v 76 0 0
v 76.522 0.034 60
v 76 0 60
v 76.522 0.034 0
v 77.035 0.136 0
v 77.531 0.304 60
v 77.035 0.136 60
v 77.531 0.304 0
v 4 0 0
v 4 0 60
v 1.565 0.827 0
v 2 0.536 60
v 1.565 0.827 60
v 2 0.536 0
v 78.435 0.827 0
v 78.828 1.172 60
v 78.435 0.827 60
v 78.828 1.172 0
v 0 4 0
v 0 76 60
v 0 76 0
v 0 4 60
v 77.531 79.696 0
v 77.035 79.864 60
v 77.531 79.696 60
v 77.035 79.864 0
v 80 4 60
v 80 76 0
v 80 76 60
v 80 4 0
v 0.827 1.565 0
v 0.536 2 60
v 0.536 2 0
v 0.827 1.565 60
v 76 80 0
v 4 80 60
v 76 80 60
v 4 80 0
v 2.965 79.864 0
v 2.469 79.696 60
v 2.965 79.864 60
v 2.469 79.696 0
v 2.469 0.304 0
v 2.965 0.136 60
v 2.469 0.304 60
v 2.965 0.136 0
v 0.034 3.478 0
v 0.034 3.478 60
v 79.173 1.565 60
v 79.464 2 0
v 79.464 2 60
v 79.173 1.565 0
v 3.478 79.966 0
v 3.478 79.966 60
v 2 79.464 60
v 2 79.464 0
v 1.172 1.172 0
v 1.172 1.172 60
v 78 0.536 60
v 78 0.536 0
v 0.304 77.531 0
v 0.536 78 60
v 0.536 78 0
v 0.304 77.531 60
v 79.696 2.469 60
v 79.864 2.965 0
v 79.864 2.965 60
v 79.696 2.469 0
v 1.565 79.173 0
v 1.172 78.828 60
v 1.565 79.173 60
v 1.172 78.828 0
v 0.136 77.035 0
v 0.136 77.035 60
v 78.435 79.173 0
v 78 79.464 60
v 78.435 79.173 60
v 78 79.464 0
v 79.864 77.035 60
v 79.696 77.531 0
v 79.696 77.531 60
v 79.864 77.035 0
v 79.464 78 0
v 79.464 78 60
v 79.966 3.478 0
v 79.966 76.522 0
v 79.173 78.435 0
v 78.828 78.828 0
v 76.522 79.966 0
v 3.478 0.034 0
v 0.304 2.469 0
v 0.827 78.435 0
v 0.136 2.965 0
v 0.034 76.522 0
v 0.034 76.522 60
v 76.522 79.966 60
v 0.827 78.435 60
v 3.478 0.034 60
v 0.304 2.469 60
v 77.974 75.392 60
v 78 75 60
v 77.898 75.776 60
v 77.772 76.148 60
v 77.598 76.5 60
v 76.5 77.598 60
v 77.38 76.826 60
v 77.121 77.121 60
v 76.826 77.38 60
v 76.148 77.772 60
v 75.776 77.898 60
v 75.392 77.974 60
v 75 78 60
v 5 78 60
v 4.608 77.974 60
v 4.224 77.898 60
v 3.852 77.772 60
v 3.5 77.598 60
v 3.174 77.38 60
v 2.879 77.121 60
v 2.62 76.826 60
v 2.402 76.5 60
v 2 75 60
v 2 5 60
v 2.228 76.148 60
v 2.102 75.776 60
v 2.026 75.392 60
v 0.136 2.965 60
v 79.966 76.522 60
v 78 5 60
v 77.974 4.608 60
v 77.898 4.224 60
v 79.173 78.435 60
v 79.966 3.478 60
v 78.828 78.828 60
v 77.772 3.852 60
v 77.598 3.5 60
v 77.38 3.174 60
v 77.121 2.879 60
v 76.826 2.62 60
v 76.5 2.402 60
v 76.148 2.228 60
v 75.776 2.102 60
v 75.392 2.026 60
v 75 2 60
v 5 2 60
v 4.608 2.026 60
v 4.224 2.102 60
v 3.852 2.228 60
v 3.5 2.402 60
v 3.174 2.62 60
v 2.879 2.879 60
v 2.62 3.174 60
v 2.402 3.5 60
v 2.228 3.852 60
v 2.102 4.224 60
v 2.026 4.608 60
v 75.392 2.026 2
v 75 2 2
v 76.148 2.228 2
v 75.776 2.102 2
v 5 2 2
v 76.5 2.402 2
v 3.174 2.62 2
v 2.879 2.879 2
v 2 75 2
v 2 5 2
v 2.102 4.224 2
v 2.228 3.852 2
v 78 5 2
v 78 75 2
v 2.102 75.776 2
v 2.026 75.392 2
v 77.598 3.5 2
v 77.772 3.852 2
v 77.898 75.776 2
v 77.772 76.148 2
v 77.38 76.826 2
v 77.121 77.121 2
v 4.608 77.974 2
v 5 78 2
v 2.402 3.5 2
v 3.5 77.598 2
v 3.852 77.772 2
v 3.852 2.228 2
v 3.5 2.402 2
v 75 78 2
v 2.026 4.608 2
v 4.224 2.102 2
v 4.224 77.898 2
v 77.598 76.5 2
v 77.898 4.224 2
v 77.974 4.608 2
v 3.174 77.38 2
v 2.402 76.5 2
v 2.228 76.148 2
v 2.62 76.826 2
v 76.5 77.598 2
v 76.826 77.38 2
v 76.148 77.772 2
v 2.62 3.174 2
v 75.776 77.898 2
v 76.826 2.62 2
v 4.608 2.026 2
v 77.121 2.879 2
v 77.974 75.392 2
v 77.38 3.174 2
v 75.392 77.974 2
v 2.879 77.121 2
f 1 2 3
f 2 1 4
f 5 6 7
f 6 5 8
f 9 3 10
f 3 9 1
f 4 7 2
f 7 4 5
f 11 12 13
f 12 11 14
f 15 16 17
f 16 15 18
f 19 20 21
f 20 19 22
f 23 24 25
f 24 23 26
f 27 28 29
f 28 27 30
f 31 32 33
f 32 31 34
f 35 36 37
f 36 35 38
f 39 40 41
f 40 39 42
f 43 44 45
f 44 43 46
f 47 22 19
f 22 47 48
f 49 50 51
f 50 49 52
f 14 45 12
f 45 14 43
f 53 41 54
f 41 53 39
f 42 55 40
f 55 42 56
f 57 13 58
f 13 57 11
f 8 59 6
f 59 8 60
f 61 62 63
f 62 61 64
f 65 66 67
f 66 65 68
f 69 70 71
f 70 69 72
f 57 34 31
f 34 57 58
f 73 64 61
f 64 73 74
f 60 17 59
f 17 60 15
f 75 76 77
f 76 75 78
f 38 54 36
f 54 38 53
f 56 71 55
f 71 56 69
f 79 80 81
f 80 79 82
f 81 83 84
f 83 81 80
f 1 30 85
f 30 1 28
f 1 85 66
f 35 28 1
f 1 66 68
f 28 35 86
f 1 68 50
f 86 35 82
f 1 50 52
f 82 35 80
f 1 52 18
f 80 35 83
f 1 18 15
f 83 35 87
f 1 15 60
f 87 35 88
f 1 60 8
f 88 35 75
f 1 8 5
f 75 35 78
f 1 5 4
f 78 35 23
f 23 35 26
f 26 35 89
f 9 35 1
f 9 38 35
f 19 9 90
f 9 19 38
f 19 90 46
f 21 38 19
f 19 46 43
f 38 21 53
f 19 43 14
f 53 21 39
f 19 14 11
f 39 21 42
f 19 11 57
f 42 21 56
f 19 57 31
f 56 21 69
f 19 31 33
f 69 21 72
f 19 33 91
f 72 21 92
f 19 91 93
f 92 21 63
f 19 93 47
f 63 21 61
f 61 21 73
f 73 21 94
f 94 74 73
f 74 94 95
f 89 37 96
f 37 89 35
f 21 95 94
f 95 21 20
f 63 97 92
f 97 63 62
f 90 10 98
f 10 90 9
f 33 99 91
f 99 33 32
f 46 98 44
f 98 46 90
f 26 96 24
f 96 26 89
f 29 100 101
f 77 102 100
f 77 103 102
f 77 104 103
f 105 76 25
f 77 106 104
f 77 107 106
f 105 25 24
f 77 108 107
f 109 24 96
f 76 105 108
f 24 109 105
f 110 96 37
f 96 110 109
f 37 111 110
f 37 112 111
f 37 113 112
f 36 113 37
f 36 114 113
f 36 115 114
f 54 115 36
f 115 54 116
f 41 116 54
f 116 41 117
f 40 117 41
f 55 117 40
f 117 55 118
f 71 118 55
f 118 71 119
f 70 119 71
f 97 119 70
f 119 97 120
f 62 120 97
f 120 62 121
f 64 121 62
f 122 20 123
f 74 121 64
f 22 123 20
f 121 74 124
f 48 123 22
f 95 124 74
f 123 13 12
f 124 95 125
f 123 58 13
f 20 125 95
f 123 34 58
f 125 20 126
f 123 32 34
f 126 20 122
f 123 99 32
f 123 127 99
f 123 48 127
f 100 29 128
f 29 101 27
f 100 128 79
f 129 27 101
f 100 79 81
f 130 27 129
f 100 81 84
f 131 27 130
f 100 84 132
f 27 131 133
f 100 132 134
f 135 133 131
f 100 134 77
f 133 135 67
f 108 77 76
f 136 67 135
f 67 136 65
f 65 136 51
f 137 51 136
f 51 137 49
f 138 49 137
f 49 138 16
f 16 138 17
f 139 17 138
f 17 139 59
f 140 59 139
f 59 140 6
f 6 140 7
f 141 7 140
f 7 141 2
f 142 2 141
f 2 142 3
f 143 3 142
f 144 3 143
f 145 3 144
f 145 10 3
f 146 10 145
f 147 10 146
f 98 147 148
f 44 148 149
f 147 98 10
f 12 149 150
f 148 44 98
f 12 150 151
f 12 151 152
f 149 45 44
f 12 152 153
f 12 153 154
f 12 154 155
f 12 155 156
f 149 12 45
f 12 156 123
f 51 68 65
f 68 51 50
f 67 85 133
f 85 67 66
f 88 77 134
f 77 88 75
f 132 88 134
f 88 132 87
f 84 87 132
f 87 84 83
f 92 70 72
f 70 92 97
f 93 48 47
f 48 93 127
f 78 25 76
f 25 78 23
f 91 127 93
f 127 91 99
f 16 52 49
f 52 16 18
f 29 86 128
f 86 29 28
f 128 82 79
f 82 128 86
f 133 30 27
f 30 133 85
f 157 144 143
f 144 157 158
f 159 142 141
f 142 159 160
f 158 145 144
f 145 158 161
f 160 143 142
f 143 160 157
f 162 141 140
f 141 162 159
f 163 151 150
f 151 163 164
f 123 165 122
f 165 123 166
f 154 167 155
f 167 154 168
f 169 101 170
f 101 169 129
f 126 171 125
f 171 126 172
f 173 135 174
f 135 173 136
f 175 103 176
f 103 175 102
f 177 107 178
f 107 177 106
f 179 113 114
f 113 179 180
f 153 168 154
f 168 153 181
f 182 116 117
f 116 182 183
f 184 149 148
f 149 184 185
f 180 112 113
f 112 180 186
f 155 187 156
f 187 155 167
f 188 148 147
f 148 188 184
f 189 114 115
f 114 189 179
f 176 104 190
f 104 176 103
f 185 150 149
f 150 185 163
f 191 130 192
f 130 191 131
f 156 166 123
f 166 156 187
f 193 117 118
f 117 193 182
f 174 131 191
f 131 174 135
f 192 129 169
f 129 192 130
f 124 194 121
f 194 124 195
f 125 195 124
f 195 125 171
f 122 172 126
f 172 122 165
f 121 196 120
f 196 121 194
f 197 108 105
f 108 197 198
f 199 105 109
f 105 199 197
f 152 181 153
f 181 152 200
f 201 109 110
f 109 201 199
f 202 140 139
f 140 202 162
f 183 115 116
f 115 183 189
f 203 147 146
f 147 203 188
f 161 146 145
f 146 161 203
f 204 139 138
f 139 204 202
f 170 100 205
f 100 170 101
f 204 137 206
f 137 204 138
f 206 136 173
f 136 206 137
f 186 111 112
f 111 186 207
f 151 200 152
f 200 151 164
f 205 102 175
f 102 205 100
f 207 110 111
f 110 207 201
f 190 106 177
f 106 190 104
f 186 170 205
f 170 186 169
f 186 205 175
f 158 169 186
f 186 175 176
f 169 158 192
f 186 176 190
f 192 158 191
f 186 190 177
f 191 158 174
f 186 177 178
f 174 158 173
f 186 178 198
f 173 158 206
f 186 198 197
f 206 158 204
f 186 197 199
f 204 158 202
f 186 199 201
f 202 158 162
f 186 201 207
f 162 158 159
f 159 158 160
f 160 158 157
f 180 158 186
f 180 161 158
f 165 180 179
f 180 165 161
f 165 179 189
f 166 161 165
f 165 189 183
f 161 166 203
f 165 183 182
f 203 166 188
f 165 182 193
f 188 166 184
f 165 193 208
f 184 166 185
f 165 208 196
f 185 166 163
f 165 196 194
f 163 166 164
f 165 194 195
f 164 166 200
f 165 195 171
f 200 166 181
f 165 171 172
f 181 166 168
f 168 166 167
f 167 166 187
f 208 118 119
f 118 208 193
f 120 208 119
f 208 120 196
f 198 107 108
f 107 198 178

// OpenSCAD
// Modular desktop organizer: five connection concepts, sketch level (2026-11-24).
// Benson's brief (business/muse_claude/threads/2026-11-24_modular-organizer-brief.md on main):
// our own modular system with a defined interface for future attachments, "a different
// connection method" from the puzzle interlock, strength from walls not infill. Scott picks
// one of these; only then is anything designed for real. These are review sketches: walls and
// fits are indicative, not checked.
//
//   part = <option>_<piece>, e.g. dovetail_a, dovetail_b; see the table at the bottom
//   Each option's pieces share one frame, posed partly apart so the joint shows.

part = "dovetail_a";
U = 40;          // the grid unit: every module is a whole number of units across
H = 60;          // a bin's height in these sketches
WALL = 2.0;      // five beads at 0.4
R = 4;           // vertical corners
$fn = 48;

module rbox(w, d, h, r = R) linear_extrude(h) offset(r) offset(-r) square([w, d]);
module bin(w, d, h) difference() {
    rbox(w, d, h);
    translate([WALL, WALL, WALL]) rbox(w - 2 * WALL, d - 2 * WALL, h, R - WALL / 2);
}

// ---- 1. drop-in dovetail: tails on +x, sockets on -x; the next module drops down onto them --
DT_W = 8; DT_N = 5; DT_D = 3.5; DT_CL = 0.25;
module tail2d(cl = 0) polygon([[-cl, -DT_N / 2 - cl], [DT_D + cl, -DT_W / 2 - cl], [DT_D + cl, DT_W / 2 + cl], [-cl, DT_N / 2 + cl]]);
module dovetail_a() bin(U * 2, U * 2, H);
module dovetail_tails() for (y = [U / 2, U * 1.5]) translate([U * 2 - 0.01, y, 4]) linear_extrude(H - 4) tail2d();
module dovetail_b() translate([U * 2 + 30, 0, 24]) difference() {   // shown lifted off its seat, and aside
    union() {
        bin(U, U * 2, H - 10);
        for (y = [U / 2, U * 1.5]) translate([-0.01, y, 0]) linear_extrude(H - 10) translate([0, -(DT_W + 6) / 2]) square([DT_D + 3, DT_W + 6]);
    }
    for (y = [U / 2, U * 1.5]) translate([-0.01, y, 4]) linear_extrude(H) tail2d(DT_CL);
}

// ---- 2. butterfly key: the same half-pocket at every unit on every side; a key joins two ------
KEY_L = 16; KEY_W = 10; KEY_N = 5; KEY_H = 16;
module key2d(cl = 0) offset(delta = cl) polygon([[-KEY_L / 2, -KEY_W / 2], [-KEY_L / 2, KEY_W / 2], [0, KEY_N / 2], [KEY_L / 2, KEY_W / 2],
                                                 [KEY_L / 2, -KEY_W / 2], [0, -KEY_N / 2]]);
module keyed(w, d, h) difference() {
    union() {
        bin(w, d, h);
        // thickened wall round each pocket, inside the bin
        for (y = [U / 2 : U : d]) for (x = [0, w]) translate([x, y, 0]) linear_extrude(h) square([KEY_L + 6, KEY_W + 6], center = true);
    }
    for (y = [U / 2 : U : d]) for (x = [0, w]) translate([x, y, h - KEY_H]) linear_extrude(KEY_H + 1) key2d(0.2);
    // trim the thickening back to the box
    translate([-50, -1, -1]) cube([50, d + 2, h + 2]);
    translate([w, -1, -1]) cube([50, d + 2, h + 2]);
}
module butterfly_a() keyed(U * 2, U * 2, H);
module butterfly_b() translate([U * 2, 0, 0]) keyed(U, U * 2, H);
module butterfly_key() for (y = [U / 2, U * 1.5]) translate([U * 2, y, H - KEY_H + (y < U ? 0 : 14)]) linear_extrude(KEY_H - 0.3) key2d();

// ---- 3. base grid: a plate of shallow sockets; every module stands in it on locating feet ----
module grid_plate() difference() {
    rbox(U * 4, U * 2, 4);
    for (i = [0 : 3], j = [0 : 1]) translate([i * U + 2, j * U + 2, 1.6]) rbox(U - 4, U - 4, 5, 3);
}
module grid_foot(w, d) for (i = [0 : w / U - 1], j = [0 : d / U - 1]) translate([i * U + 2.3, j * U + 2.3, 0]) rbox(U - 4.6, U - 4.6, 2.6, 2.8);
module grid_a() translate([0, 0, 1.6]) union() { translate([0, 0, 2.6]) bin(U * 2, U * 2, H); grid_foot(U * 2, U * 2); }
module grid_b() translate([U * 2, 0, 22]) union() { translate([0, 0, 2.6]) bin(U * 2, U, H - 20); grid_foot(U * 2, U); }

// ---- 4. back rail: one dovetail rail on the desk; modules slide on along it from the end -----
RAIL_L = U * 4; RAIL_W = 14; RAIL_H = 6;
module rail2d(cl = 0) polygon([[-RAIL_W / 2 + 2 - cl, -cl], [RAIL_W / 2 - 2 + cl, -cl], [RAIL_W / 2 + cl, RAIL_H + cl], [-RAIL_W / 2 - cl, RAIL_H + cl]]);
module rail_rail() translate([0, U * 2 + RAIL_W / 2 - 2, 0]) union() {
    rotate([90, 0, 90]) linear_extrude(RAIL_L) translate([0, 0]) polygon([[-RAIL_W / 2 - 4, 0], [RAIL_W / 2 + 4, 0], [RAIL_W / 2 + 4, 1.6], [-RAIL_W / 2 - 4, 1.6]]);
    translate([0, 0, 1.59]) rotate([90, 0, 90]) linear_extrude(RAIL_L) rail2d();
}
module railed(x, w, h, lift = 0) translate([x, 0, lift]) difference() {
    union() { bin(w, U * 2, h); translate([0, U * 2 - 2, 0]) cube([w, RAIL_W + 4, h]); }
    translate([-1, U * 2 + RAIL_W / 2 - 2, -0.01]) rotate([90, 0, 90]) linear_extrude(w + 2) rail2d(0.25);
    translate([-1, U * 2 + RAIL_W / 2 - 2, -0.01]) rotate([90, 0, 90]) linear_extrude(w + 2) translate([0, 0.8]) square([RAIL_W + 9, 1.65], center = true);
}
module rail_a() railed(0, U, H + 20);
module rail_b() railed(U + 0.5, U * 2, H - 15);
module rail_c() railed(U * 3 + 26, U, H, 0);   // sliding on from the end

// ---- 5. magnets: 6 x 3 discs pressed into pockets behind a 0.6 skin, every unit, every side ---
MAG_D = 6; MAG_T = 3;
module magnet_bin(w, d, h) difference() {
    union() {
        bin(w, d, h);
        for (y = [U / 2 : U : d]) for (x = [WALL, w - WALL]) for (z = [12, h - 12]) translate([x, y, z]) rotate([0, 90, 0]) cylinder(h = 2 * (MAG_T + 0.6), r = MAG_D / 2 + 1.6, center = true);
    }
    translate([-50, -1, -1]) cube([50, d + 2, h + 2]);
    translate([w, -1, -1]) cube([50, d + 2, h + 2]);
}
module magnet_a() magnet_bin(U * 2, U * 2, H);
module magnet_b() translate([U * 2 + 10, 0, 0]) magnet_bin(U, U * 2, H);
module magnet_discs() for (o = [0, U * 2 + 10]) for (x = [0.6, U * (o ? 1 : 2) - 0.6 - MAG_T]) for (y = [U / 2, U * 1.5]) for (z = [12, H - 12])
    translate([o + x, y, z]) rotate([0, 90, 0]) cylinder(h = MAG_T, r = MAG_D / 2);

if      (part == "dovetail_a") dovetail_a();
else if (part == "dovetail_b") dovetail_b();
else if (part == "dovetail_tails") dovetail_tails();
else if (part == "butterfly_a") butterfly_a();
else if (part == "butterfly_b") butterfly_b();
else if (part == "butterfly_key") butterfly_key();
else if (part == "grid_plate") grid_plate();
else if (part == "grid_a") grid_a();
else if (part == "grid_b") grid_b();
else if (part == "rail_rail") rail_rail();
else if (part == "rail_a") rail_a();
else if (part == "rail_b") rail_b();
else if (part == "rail_c") rail_c();
else if (part == "magnet_a") magnet_a();
else if (part == "magnet_b") magnet_b();
else if (part == "magnet_discs") magnet_discs();
